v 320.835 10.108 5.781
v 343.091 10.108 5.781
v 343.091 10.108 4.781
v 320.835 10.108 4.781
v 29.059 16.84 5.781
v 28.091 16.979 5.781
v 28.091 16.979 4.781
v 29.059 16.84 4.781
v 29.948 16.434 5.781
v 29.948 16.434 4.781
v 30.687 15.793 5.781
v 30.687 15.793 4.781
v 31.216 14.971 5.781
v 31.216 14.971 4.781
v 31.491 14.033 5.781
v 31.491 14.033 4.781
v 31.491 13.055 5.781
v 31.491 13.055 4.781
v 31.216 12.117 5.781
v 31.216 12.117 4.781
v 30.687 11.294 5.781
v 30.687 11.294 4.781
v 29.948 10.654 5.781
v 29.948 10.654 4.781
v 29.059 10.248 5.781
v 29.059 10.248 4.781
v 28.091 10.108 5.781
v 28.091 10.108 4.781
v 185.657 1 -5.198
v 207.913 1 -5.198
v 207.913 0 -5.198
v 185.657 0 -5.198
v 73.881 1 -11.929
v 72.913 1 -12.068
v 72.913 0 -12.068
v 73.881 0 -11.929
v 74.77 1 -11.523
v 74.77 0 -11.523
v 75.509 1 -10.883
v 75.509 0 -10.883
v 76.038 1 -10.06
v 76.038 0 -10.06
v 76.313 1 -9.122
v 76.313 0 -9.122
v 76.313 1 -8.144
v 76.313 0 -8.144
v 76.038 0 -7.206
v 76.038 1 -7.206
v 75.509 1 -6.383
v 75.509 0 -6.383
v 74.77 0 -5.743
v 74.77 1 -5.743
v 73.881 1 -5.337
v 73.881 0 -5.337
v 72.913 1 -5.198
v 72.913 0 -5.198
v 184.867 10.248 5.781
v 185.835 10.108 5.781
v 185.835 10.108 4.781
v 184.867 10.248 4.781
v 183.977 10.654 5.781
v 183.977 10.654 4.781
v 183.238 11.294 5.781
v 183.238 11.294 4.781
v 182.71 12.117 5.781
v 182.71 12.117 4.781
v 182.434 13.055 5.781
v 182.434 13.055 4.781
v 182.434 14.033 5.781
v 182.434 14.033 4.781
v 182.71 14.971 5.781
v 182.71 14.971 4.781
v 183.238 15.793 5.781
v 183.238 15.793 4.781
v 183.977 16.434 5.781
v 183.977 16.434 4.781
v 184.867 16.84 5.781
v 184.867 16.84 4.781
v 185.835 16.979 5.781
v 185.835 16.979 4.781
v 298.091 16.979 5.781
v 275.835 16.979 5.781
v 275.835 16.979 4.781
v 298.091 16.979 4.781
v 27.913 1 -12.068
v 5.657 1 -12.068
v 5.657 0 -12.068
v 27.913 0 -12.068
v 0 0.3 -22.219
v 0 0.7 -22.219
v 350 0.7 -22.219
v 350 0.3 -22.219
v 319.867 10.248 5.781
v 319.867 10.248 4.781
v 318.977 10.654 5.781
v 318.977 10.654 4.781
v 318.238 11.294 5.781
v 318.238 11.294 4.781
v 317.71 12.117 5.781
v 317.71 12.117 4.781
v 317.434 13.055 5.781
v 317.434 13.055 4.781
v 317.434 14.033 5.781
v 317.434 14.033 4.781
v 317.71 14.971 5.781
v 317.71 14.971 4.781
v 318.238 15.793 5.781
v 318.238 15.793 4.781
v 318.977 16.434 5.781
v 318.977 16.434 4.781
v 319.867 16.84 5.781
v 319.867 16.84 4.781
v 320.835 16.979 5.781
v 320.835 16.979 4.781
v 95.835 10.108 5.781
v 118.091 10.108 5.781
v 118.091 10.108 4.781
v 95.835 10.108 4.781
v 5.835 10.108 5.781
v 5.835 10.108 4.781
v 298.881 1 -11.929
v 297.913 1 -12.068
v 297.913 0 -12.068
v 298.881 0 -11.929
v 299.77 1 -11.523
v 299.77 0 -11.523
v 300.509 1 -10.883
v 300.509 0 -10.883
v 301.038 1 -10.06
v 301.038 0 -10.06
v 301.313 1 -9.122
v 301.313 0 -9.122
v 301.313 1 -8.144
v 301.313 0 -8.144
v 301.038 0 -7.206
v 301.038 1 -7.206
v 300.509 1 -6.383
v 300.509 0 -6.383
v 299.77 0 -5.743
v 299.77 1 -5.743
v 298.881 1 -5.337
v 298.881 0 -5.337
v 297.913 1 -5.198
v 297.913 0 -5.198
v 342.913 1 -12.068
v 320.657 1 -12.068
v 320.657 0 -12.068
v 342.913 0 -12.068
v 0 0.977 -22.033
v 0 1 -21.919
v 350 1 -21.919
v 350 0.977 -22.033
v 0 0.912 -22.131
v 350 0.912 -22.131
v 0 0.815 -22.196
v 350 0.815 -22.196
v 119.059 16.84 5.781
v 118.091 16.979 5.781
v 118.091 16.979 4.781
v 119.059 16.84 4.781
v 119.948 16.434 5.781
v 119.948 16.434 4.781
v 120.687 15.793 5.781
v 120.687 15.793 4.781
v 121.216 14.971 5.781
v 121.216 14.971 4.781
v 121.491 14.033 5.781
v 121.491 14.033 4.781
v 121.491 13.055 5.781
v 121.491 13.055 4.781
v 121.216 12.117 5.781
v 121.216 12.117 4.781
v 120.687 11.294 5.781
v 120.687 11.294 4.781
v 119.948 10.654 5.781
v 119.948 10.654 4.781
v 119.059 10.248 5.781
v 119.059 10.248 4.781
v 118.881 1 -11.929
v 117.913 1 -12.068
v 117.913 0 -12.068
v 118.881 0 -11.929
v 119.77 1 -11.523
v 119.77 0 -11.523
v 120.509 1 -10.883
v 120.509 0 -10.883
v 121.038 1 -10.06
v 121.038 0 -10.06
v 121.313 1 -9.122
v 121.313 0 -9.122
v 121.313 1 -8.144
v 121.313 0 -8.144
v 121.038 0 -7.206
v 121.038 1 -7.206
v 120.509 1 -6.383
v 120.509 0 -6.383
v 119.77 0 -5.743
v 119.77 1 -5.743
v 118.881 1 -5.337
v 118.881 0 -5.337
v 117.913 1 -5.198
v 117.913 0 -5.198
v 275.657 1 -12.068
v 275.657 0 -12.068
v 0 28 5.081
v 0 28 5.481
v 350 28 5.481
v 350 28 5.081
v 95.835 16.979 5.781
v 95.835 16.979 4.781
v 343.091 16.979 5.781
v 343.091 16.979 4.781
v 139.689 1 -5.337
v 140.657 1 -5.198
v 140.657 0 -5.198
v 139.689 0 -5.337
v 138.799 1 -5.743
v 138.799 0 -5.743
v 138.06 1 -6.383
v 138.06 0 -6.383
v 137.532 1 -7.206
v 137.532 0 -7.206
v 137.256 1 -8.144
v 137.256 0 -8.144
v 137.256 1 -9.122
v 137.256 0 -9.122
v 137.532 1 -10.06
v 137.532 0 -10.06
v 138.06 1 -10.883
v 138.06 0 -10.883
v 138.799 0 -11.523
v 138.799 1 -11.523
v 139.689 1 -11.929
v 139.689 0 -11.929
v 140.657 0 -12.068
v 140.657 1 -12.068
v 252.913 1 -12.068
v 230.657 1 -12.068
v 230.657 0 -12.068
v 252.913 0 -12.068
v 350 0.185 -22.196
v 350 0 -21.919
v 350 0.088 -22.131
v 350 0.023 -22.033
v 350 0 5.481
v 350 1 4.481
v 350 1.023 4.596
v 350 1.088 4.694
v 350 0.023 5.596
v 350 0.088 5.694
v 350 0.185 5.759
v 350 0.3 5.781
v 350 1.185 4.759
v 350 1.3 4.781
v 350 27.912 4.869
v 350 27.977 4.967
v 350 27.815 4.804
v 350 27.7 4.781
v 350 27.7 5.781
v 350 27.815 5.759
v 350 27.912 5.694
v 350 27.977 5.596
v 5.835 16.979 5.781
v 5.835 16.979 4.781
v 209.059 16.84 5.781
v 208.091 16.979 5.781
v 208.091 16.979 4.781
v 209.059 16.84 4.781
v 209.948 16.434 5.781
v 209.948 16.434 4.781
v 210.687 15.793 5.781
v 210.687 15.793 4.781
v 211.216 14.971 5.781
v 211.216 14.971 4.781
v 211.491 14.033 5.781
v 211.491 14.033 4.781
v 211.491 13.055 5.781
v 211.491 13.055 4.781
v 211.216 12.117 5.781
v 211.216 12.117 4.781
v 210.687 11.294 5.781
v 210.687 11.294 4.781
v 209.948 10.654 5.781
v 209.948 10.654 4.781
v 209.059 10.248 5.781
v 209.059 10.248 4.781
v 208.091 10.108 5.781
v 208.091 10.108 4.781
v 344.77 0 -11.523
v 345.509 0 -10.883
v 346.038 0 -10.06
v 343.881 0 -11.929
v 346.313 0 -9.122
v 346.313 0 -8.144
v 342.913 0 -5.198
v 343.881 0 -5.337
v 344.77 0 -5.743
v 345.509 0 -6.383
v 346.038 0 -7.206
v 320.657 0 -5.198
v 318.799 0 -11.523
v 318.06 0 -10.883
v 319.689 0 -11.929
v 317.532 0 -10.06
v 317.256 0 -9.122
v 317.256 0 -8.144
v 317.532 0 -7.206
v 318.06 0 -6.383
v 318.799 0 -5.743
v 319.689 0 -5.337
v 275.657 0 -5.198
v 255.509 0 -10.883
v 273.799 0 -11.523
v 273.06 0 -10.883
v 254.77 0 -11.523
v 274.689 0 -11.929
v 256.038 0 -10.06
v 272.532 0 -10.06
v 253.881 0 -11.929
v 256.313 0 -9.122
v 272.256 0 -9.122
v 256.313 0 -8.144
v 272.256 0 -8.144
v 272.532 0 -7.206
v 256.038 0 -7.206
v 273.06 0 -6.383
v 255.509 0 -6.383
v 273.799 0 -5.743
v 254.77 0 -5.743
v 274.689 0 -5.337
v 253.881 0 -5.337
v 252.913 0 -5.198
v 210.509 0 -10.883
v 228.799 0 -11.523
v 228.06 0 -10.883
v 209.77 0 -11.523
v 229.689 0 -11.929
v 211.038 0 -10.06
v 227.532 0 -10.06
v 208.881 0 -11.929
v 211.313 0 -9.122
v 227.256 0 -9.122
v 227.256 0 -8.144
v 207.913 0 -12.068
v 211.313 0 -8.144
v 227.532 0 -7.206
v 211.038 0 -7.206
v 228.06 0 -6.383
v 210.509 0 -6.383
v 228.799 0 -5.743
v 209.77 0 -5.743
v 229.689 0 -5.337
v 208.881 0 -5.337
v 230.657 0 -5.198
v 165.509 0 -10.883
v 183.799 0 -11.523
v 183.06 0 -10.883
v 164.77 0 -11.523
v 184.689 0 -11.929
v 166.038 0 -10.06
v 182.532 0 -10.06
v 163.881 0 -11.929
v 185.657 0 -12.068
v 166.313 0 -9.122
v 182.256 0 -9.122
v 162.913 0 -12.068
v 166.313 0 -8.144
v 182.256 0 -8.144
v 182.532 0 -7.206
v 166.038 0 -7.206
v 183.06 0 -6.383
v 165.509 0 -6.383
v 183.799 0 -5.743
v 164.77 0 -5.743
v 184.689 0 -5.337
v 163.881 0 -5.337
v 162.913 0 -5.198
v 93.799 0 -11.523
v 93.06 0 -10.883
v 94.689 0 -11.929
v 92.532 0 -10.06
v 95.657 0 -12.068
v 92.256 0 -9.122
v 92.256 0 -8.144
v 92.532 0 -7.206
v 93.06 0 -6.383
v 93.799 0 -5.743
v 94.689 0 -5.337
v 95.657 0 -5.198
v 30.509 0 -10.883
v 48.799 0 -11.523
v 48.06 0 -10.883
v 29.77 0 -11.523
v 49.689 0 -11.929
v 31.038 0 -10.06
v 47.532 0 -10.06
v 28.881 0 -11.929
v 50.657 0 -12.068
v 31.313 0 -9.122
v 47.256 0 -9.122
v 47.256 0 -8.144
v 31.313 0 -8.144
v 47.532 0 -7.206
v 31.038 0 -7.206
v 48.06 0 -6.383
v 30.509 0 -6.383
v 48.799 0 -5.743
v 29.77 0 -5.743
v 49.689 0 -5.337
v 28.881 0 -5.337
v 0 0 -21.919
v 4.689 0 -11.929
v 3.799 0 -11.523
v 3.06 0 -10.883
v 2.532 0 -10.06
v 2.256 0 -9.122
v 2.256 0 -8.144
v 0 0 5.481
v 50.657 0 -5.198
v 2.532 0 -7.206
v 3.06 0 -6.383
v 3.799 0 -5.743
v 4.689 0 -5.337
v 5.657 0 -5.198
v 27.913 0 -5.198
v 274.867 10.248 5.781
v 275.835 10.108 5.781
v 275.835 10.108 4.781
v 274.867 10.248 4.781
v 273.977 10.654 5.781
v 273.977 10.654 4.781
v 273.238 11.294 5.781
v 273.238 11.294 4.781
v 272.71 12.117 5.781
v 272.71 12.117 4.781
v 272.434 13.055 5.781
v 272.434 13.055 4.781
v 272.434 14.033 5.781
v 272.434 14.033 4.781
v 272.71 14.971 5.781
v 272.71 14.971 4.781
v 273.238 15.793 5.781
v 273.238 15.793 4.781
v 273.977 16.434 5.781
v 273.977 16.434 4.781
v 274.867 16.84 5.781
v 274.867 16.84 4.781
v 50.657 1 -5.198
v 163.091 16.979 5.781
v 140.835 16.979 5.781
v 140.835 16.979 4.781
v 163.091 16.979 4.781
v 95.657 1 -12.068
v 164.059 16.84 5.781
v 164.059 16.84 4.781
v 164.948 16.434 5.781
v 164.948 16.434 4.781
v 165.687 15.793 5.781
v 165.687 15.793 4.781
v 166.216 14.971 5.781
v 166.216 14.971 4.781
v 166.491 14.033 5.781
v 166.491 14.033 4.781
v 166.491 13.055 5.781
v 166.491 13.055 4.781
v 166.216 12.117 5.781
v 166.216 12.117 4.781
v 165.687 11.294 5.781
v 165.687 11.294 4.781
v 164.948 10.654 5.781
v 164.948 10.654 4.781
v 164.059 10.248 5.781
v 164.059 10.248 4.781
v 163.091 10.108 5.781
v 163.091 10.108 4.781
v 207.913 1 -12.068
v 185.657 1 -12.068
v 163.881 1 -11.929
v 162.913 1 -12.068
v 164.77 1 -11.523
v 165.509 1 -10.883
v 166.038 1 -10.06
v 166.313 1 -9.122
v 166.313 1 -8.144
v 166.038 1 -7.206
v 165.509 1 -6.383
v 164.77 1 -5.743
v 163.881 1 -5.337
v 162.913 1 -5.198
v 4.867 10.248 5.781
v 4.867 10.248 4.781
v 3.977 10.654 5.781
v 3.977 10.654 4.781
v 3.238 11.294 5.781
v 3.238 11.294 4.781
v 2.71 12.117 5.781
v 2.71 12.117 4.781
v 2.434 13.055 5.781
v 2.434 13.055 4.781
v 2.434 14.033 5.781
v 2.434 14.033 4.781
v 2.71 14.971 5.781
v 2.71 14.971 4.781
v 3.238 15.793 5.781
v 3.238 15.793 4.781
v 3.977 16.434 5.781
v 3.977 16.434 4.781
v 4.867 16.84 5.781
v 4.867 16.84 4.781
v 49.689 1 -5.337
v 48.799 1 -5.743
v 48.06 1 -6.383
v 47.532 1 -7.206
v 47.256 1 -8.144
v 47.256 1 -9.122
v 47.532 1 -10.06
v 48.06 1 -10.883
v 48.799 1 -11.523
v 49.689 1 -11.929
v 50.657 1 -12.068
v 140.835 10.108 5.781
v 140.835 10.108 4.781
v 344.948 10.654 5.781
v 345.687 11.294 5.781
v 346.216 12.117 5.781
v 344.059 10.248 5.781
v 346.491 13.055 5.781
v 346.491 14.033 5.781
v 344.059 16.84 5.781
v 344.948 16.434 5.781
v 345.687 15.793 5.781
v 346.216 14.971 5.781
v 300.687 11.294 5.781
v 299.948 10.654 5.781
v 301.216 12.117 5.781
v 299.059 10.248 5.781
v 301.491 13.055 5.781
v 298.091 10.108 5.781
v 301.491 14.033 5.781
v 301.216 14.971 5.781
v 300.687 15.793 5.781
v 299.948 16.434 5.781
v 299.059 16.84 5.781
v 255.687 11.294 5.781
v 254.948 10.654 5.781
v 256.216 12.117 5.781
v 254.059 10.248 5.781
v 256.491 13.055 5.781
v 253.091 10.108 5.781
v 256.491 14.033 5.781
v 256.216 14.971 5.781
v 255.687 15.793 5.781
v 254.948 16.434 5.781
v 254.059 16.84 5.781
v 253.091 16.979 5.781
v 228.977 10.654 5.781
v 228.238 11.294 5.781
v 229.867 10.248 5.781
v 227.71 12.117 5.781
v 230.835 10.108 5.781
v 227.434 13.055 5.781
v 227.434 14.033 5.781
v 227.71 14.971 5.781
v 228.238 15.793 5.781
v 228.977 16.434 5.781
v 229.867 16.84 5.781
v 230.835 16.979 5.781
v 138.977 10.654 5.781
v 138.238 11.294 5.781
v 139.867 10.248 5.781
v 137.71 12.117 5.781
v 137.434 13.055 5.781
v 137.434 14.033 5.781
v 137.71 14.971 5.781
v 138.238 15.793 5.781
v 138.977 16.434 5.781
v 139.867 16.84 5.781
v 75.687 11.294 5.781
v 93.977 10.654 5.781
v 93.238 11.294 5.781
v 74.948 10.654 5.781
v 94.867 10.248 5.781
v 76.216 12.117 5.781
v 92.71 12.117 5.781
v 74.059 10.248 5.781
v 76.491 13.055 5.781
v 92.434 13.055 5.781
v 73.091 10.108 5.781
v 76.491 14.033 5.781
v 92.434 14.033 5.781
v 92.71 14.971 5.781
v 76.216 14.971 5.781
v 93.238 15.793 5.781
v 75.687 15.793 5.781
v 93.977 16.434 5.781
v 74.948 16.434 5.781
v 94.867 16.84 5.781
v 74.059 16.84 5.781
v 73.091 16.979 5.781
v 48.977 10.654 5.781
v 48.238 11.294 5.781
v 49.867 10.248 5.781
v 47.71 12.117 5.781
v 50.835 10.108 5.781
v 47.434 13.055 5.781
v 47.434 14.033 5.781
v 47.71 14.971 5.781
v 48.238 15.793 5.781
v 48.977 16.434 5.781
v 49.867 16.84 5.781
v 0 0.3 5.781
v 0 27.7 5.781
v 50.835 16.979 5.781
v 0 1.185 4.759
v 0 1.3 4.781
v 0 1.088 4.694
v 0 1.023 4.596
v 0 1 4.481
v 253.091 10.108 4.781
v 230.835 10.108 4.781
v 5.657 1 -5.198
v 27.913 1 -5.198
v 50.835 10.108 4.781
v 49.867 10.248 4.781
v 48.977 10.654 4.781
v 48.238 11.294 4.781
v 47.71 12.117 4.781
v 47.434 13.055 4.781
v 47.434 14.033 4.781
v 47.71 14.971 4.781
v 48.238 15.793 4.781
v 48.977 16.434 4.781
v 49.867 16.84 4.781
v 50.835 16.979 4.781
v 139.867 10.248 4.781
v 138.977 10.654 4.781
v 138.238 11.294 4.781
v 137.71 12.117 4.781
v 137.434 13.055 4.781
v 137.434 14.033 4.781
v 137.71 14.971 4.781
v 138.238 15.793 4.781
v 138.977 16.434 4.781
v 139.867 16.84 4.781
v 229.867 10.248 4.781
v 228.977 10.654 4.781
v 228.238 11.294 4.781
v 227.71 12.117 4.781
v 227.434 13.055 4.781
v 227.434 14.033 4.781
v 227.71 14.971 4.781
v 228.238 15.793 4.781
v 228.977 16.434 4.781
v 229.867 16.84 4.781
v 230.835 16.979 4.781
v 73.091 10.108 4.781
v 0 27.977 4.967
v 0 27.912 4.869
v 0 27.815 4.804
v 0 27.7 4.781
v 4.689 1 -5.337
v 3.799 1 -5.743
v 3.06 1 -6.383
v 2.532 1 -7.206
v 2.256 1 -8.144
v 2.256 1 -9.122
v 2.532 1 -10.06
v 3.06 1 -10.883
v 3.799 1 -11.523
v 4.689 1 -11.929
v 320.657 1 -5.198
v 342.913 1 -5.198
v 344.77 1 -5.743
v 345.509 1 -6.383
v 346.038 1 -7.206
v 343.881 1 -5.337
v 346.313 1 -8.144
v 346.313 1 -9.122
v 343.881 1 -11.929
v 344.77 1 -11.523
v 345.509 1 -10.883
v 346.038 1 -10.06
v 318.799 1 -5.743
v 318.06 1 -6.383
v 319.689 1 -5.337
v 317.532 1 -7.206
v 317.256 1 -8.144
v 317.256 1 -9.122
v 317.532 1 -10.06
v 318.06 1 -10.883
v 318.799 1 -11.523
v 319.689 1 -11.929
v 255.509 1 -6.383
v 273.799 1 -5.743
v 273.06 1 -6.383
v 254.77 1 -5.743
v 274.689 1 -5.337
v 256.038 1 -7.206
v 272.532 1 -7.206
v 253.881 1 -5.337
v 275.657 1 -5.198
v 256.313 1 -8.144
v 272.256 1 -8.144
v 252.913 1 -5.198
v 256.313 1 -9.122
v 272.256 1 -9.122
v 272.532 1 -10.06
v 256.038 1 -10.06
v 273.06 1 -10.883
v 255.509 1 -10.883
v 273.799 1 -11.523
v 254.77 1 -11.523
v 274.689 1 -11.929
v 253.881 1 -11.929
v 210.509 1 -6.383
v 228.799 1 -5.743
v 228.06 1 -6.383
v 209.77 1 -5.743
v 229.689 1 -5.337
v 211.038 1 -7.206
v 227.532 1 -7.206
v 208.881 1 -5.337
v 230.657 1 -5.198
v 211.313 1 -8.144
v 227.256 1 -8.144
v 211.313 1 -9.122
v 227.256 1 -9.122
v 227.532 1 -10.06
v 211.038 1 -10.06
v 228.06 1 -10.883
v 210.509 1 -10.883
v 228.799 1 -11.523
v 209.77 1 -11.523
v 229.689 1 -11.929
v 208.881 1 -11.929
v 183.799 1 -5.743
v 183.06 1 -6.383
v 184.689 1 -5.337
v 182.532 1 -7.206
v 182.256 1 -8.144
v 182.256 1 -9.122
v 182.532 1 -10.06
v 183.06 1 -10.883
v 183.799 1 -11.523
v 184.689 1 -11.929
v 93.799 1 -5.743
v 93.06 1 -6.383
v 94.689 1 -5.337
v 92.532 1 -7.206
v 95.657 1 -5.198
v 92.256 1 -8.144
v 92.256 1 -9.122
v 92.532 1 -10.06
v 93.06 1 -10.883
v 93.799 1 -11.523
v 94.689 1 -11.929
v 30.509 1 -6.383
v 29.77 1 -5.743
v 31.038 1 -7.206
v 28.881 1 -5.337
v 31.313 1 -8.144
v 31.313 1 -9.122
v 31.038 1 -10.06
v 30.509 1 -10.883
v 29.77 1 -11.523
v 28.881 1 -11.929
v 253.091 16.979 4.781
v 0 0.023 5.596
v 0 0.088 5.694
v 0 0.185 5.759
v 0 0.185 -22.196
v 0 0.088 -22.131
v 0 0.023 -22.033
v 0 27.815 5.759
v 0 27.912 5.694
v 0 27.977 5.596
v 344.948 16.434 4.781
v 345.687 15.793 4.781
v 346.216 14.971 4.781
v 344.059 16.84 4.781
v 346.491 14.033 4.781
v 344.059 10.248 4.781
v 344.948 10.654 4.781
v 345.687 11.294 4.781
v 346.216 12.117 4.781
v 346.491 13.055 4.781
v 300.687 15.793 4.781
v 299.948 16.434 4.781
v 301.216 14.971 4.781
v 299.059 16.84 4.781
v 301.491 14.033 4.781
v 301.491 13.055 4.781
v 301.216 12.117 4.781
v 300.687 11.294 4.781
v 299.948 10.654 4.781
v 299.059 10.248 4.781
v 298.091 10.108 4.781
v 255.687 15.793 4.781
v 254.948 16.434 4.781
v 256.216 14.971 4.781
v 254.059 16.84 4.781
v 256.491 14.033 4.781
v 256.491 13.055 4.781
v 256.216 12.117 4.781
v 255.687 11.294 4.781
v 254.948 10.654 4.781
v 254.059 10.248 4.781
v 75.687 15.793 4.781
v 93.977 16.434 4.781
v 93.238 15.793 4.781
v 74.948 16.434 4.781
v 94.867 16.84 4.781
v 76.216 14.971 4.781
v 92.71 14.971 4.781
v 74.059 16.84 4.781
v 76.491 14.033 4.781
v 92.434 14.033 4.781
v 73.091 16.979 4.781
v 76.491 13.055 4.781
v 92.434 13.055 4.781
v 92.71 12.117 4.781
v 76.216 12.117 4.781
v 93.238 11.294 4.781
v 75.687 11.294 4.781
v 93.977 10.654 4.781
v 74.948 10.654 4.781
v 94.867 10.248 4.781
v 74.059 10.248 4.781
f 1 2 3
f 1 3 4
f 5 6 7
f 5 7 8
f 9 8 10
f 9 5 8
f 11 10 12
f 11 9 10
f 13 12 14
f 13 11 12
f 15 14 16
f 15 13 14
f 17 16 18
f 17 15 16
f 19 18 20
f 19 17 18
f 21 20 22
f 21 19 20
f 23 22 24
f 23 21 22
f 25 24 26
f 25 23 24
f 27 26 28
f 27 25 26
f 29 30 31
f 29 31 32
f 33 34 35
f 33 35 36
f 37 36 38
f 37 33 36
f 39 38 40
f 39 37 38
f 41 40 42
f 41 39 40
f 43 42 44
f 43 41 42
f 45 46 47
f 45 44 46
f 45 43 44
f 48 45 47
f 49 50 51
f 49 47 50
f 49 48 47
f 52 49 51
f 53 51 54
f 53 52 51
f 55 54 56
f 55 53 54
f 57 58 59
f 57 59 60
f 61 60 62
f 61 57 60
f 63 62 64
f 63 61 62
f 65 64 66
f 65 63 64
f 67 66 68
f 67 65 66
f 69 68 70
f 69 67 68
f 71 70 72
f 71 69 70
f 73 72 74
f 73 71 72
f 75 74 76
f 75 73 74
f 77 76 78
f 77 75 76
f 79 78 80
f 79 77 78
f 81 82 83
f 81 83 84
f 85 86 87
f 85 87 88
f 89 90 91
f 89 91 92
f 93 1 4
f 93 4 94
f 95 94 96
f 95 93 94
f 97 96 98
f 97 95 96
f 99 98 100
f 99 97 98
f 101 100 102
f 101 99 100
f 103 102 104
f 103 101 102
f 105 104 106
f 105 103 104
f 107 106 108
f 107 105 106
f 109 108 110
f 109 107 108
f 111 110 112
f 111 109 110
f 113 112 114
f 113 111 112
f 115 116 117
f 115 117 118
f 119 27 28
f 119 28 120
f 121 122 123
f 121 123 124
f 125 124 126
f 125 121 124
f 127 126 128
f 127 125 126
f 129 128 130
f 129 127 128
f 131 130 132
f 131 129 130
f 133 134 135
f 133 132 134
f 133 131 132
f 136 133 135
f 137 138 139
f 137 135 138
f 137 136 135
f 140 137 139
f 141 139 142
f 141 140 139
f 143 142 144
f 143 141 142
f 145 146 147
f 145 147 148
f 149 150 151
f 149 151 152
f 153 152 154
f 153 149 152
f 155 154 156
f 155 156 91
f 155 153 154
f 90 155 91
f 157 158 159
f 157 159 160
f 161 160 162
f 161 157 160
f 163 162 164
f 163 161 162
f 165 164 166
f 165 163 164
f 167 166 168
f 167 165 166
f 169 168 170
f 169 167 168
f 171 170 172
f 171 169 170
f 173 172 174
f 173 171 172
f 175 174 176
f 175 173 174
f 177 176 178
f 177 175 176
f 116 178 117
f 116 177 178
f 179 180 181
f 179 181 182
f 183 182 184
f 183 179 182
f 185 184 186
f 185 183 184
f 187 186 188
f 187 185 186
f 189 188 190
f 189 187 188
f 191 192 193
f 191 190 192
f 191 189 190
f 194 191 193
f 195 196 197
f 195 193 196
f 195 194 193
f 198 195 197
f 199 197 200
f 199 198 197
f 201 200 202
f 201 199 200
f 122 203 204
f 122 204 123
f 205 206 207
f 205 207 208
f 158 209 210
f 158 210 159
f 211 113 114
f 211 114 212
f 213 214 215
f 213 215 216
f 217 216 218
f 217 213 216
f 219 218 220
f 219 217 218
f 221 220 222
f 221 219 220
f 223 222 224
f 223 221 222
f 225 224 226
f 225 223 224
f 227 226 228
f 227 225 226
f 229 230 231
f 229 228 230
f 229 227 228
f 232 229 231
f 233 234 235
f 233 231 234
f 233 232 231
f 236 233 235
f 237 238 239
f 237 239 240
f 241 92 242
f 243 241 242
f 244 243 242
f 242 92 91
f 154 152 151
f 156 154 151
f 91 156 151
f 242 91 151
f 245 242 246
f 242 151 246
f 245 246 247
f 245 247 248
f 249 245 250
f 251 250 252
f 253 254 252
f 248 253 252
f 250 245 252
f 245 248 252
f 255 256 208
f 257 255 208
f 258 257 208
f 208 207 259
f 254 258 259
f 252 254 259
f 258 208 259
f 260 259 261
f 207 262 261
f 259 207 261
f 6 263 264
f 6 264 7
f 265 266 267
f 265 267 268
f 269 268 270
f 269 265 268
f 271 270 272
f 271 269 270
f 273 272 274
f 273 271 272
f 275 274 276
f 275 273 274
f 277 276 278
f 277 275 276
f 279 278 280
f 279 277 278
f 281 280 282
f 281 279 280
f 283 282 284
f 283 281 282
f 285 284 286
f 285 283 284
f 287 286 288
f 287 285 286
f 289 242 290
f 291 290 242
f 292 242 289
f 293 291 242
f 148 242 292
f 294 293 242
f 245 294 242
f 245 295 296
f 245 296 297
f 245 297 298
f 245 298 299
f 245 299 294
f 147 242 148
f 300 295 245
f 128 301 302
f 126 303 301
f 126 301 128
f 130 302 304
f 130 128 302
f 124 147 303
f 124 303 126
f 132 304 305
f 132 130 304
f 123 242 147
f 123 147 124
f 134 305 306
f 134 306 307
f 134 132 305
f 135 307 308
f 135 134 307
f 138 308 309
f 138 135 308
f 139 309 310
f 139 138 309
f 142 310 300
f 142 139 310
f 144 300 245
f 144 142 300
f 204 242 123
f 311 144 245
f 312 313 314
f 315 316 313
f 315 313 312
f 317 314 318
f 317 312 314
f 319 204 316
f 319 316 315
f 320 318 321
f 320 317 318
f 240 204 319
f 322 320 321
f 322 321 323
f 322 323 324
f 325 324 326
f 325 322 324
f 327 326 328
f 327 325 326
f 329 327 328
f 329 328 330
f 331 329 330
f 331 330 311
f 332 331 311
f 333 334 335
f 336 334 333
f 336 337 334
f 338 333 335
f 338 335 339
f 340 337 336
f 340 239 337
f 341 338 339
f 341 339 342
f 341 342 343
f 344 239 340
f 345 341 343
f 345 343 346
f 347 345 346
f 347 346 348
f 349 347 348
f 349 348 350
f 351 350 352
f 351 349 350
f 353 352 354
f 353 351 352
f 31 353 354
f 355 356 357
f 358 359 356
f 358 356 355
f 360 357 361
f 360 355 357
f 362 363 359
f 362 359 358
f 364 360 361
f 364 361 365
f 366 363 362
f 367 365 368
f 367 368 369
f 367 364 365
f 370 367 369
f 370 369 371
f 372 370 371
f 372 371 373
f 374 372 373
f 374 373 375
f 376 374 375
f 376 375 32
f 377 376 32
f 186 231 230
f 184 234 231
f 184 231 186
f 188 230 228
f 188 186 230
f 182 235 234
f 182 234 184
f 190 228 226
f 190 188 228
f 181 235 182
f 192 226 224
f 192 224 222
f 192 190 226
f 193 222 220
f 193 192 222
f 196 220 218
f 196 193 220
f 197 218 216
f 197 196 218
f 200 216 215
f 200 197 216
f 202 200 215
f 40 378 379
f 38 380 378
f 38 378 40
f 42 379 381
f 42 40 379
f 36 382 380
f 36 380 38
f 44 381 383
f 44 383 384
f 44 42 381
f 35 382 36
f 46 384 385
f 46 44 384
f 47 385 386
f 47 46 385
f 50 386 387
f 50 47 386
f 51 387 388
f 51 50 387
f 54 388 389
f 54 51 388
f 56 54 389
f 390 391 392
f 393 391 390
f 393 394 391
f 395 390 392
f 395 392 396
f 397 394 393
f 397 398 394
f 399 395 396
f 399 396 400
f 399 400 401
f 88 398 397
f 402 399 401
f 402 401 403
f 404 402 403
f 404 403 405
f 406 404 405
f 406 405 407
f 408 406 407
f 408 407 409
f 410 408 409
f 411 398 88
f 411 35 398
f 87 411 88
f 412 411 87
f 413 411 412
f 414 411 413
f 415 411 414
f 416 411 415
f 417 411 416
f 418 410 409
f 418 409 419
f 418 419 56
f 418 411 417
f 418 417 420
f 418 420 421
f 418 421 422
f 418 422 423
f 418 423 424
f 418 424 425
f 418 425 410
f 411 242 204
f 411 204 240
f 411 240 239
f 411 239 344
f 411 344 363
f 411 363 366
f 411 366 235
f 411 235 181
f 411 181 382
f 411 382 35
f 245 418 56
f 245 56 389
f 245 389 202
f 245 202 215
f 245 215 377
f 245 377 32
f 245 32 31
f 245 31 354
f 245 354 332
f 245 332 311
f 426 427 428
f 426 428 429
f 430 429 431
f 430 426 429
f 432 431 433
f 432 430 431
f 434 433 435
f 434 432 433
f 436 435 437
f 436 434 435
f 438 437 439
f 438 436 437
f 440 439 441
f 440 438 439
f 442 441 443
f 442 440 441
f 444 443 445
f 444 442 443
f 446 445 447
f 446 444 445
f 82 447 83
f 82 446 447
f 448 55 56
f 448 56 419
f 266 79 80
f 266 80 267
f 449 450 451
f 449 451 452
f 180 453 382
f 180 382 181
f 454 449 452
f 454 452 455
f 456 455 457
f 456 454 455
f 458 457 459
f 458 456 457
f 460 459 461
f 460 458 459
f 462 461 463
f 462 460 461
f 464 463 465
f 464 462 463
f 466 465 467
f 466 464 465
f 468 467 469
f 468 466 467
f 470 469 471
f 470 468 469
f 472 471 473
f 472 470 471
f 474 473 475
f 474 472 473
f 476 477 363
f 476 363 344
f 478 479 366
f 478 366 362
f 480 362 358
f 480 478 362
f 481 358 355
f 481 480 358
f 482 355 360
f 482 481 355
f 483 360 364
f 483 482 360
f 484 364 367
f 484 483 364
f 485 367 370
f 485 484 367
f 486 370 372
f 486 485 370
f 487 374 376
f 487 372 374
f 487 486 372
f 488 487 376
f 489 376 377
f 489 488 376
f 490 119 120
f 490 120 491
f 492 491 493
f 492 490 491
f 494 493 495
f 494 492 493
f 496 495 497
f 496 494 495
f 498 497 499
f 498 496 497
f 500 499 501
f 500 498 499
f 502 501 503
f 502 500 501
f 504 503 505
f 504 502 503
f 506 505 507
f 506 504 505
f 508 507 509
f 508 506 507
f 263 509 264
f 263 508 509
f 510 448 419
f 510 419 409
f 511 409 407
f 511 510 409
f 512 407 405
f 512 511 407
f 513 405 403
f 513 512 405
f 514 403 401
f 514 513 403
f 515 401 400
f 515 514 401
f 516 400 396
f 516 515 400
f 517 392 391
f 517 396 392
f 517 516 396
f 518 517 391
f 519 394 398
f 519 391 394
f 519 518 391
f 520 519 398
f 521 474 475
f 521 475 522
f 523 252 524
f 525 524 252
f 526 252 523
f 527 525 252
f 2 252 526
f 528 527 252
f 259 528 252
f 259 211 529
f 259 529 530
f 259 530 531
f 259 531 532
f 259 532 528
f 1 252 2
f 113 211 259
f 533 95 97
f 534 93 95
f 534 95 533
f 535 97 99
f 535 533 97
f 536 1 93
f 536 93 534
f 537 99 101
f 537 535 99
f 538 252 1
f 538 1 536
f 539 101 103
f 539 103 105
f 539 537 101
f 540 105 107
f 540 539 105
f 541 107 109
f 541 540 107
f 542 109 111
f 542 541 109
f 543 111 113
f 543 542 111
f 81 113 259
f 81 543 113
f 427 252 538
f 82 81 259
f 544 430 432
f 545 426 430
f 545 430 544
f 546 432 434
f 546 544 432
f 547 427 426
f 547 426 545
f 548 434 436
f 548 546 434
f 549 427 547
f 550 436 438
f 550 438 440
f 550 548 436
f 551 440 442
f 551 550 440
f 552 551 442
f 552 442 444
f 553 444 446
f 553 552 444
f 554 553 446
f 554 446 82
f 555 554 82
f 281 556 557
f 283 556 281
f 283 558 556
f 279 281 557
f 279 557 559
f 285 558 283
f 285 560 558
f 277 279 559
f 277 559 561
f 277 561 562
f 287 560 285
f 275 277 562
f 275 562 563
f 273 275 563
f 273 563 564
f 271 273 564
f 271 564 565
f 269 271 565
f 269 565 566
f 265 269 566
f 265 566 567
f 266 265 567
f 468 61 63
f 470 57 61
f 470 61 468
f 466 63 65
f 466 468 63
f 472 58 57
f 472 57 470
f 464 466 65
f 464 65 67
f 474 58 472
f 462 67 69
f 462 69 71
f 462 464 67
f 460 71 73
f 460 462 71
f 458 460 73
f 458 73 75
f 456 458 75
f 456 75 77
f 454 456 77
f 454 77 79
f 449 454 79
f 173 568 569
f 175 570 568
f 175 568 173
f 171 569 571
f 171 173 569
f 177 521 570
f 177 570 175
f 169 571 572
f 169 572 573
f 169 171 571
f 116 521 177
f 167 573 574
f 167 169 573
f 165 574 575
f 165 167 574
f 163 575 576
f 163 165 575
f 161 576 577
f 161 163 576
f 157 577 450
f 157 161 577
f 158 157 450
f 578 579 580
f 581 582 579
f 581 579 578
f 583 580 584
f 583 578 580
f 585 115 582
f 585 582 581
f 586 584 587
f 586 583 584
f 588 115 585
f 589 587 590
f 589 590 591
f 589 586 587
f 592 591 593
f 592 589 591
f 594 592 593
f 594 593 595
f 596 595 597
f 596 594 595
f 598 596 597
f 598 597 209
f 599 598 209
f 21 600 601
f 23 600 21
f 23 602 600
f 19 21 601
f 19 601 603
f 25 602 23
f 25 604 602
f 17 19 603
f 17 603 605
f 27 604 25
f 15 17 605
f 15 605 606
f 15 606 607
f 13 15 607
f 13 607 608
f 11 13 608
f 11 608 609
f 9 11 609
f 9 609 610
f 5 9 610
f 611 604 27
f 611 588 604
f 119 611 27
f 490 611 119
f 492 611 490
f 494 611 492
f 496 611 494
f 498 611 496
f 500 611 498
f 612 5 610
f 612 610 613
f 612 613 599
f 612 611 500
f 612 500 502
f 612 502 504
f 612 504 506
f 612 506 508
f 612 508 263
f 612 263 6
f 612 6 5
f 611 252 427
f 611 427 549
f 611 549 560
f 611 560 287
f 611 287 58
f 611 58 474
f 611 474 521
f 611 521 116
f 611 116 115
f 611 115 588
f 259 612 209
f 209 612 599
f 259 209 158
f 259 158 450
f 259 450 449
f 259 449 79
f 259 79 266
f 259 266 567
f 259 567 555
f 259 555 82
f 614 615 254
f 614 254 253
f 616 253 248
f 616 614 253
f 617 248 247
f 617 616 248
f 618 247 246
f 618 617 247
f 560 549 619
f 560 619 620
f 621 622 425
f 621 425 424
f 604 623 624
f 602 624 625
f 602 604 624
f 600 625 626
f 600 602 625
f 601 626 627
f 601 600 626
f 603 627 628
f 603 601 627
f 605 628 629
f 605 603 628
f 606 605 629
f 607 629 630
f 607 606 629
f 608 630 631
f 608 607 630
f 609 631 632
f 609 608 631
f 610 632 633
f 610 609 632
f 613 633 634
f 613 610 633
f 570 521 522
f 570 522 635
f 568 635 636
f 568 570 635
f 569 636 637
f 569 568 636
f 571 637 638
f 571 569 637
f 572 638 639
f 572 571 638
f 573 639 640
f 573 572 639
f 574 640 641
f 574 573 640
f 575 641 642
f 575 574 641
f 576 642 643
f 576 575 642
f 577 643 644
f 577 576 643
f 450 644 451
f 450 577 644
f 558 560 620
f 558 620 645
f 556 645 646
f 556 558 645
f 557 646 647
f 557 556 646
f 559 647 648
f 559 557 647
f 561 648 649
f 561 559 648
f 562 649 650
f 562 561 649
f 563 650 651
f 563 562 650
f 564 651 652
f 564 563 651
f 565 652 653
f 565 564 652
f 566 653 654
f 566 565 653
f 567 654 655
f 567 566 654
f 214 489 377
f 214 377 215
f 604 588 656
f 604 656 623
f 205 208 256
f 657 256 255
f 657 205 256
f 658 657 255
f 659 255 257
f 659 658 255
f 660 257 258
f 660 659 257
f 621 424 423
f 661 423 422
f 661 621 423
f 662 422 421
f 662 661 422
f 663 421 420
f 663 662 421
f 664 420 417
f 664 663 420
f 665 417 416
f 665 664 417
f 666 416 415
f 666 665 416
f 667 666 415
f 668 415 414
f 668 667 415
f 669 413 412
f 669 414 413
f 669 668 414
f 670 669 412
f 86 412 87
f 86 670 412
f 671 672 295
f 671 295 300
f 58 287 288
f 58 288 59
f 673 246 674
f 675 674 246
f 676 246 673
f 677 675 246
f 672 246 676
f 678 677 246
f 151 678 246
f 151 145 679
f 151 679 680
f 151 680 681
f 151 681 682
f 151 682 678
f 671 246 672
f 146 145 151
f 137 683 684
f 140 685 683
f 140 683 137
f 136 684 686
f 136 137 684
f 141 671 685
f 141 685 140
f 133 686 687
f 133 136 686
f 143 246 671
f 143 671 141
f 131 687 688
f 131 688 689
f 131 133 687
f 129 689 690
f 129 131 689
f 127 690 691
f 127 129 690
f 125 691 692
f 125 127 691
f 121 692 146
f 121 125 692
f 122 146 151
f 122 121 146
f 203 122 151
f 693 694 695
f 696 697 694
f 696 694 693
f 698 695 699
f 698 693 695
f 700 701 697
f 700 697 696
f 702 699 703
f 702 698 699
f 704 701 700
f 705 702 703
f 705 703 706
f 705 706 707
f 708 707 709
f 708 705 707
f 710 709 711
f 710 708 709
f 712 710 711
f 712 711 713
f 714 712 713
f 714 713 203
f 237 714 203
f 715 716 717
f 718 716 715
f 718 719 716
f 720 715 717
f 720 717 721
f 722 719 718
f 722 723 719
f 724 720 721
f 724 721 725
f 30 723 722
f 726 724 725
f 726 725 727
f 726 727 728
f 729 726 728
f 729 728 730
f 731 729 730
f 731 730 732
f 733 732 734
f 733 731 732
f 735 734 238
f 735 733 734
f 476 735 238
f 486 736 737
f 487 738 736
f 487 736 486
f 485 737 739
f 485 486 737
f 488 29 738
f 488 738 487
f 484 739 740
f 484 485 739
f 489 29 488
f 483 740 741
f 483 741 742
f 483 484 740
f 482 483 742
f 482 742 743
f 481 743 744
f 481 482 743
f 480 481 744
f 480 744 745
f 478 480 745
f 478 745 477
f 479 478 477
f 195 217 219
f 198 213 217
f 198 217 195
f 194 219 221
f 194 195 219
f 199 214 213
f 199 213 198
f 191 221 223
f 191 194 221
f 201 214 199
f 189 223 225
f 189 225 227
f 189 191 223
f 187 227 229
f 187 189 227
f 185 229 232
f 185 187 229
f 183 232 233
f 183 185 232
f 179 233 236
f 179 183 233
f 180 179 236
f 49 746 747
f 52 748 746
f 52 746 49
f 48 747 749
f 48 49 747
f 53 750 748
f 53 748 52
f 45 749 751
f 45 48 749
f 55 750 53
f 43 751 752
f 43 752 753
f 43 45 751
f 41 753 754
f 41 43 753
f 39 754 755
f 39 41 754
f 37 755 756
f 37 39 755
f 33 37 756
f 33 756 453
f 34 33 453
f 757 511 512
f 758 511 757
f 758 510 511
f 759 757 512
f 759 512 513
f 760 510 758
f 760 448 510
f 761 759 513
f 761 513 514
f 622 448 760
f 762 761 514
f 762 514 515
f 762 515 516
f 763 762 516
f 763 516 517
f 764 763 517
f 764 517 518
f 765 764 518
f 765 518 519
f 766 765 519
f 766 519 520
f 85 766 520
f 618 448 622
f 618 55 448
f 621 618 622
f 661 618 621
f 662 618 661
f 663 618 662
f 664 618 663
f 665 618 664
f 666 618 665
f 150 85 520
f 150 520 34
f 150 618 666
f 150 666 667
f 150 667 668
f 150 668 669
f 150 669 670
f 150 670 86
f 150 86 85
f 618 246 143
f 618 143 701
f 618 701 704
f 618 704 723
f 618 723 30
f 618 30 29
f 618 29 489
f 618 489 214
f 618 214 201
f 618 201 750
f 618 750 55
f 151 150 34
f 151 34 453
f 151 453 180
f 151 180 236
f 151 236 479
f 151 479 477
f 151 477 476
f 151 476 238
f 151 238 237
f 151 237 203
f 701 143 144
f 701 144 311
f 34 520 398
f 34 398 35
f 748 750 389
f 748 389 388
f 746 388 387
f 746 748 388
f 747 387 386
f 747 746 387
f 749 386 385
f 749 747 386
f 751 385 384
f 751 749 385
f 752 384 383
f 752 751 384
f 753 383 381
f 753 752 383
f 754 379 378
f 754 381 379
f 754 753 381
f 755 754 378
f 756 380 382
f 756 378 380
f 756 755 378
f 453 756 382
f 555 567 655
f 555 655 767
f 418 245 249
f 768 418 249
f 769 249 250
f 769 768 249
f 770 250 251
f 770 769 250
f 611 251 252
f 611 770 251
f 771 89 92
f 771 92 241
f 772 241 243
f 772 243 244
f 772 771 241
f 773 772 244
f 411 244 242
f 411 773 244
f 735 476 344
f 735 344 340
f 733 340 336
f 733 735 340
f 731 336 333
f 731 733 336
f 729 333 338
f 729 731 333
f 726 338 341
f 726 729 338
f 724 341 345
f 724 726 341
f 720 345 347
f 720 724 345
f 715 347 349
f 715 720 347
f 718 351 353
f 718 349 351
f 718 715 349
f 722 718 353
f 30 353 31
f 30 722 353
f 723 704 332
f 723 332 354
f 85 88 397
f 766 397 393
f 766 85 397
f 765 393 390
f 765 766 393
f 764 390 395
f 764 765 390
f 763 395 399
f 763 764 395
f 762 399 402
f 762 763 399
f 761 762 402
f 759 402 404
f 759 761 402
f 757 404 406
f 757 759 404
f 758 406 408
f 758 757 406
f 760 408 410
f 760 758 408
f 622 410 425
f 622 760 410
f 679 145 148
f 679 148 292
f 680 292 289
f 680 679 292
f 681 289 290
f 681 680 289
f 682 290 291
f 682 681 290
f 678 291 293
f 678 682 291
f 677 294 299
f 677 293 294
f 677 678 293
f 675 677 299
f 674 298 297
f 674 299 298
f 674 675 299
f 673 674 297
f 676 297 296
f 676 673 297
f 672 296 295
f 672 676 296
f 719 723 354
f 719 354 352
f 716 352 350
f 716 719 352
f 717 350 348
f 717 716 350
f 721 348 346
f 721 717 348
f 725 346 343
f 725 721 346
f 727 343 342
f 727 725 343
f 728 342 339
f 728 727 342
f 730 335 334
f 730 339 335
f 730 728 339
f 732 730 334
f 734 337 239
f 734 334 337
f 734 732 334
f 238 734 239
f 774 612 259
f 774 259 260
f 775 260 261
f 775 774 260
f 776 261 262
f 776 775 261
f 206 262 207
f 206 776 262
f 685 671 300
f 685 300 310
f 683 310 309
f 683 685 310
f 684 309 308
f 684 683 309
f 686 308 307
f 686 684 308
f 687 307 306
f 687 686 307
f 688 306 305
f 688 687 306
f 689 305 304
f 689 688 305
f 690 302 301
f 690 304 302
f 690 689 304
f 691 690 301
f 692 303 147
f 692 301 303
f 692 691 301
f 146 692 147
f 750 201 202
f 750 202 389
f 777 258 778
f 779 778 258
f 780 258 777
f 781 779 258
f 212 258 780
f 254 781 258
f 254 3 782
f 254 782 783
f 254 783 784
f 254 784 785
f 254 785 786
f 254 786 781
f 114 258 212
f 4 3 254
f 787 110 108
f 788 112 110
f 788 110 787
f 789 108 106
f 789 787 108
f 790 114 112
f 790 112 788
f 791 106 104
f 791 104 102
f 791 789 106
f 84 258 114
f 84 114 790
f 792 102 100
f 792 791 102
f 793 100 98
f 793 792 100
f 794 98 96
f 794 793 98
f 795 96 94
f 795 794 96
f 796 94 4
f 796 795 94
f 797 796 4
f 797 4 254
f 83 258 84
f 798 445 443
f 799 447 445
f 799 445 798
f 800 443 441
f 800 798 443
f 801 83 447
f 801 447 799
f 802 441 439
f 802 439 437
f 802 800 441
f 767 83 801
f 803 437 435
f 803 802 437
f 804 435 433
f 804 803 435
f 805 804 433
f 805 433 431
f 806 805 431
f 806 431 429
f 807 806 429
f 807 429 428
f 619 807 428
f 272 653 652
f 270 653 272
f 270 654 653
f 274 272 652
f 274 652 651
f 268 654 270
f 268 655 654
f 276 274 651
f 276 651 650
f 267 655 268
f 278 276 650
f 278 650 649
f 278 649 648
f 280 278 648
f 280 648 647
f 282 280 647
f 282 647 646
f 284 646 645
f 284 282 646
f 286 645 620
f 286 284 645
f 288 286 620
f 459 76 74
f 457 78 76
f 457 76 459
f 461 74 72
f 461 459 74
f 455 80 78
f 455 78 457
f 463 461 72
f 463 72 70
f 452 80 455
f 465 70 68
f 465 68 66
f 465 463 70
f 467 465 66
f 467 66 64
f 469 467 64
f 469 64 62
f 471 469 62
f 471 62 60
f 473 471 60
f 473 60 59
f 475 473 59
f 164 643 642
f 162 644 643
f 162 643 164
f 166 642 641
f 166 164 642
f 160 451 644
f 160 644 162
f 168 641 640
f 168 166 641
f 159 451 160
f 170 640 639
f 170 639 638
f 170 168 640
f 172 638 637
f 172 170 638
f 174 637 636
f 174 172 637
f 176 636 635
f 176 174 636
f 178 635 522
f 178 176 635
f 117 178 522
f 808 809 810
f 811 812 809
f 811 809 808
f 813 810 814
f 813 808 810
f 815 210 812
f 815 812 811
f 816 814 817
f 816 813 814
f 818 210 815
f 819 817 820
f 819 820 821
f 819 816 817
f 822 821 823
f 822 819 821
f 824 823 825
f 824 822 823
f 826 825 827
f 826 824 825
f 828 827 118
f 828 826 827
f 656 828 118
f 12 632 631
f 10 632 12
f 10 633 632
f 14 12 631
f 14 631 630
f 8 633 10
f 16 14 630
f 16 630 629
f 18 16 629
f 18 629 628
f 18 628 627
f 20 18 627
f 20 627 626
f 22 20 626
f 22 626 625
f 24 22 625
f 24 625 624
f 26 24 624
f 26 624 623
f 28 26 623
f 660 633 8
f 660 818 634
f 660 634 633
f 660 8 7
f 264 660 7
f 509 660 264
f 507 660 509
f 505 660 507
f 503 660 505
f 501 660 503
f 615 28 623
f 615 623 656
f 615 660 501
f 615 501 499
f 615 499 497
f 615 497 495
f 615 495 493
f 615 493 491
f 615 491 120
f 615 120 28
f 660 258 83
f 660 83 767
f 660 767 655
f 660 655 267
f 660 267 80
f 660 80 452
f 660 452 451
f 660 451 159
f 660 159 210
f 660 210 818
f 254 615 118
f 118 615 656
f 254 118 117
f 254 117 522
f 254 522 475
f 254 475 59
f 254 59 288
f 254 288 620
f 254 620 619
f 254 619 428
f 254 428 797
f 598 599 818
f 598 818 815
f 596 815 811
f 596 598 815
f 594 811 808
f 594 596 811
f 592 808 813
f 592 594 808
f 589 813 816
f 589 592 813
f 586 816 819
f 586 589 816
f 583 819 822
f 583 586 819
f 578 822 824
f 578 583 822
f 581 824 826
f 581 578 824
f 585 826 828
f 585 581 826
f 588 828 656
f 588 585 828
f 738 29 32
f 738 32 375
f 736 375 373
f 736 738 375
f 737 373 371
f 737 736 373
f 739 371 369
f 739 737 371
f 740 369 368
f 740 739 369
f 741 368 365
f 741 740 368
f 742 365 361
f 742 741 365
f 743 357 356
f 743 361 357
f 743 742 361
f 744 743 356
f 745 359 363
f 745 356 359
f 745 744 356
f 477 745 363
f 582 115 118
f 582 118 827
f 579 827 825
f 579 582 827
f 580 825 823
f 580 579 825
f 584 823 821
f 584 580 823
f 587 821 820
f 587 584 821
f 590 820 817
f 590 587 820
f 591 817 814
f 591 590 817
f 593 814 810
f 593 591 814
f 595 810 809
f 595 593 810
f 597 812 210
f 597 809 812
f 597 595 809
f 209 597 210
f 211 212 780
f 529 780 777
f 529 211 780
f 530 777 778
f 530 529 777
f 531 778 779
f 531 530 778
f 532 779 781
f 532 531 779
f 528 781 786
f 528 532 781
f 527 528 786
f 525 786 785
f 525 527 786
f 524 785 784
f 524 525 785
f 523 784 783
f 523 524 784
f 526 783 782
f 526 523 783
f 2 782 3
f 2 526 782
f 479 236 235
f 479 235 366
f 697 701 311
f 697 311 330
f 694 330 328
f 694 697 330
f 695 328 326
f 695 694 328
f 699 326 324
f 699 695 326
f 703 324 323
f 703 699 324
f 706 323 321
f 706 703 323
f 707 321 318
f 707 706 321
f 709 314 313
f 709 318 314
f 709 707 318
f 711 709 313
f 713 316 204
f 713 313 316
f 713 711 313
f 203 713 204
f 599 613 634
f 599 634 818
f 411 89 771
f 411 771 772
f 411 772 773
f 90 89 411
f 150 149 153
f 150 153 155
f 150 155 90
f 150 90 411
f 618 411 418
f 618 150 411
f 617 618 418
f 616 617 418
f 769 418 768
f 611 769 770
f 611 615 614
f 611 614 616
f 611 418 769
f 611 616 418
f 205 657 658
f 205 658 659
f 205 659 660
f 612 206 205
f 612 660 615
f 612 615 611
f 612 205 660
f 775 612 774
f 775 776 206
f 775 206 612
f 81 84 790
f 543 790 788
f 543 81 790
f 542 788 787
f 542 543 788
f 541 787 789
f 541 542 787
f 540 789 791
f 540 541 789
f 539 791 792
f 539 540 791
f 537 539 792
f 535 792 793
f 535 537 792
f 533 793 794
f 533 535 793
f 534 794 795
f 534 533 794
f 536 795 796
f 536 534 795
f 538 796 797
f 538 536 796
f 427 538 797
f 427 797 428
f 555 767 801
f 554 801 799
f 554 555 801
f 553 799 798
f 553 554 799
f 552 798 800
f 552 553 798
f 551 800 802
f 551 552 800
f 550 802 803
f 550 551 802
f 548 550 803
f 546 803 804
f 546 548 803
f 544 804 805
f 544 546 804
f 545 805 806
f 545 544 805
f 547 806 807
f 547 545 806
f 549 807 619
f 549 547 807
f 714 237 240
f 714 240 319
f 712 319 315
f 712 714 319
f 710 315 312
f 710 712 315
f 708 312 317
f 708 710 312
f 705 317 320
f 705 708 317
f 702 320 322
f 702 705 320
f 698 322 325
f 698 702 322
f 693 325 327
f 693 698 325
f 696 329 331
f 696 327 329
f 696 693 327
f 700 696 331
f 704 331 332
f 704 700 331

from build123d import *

# Parameters (mm, degrees)
EXTRUDE_1_DEPTH     = 350
CUT_EXTRUDE_1_REACH = 30
CUT_EXTRUDE_2_REACH = 3


with BuildPart() as part:
    # 草图1 → 凸台-拉伸1 (new body)
    with BuildSketch(Plane(origin=(0, 0, 0), x_dir=(0, 0, -1), z_dir=(1, 0, 0))):
        with BuildLine():
            Line((0, 0), (-5.481376518, 0))
            ThreePointArc((-5.481376518, 0), (-5.693508553, 0.087867966), (-5.781376518, 0.3))
            Line((-5.781376518, 0.3), (-5.781376518, 27.7))
            ThreePointArc((-5.781376518, 27.7), (-5.693508553, 27.912132034), (-5.481376518, 28))
            Line((-5.481376518, 28), (-5.081376518, 28))
            ThreePointArc((-5.081376518, 28), (-4.869244484, 27.912132034), (-4.781376518, 27.7))
            Line((-4.781376518, 27.7), (-4.781376518, 1.3))
            ThreePointArc((-4.781376518, 1.3), (-4.693508553, 1.087867966), (-4.481376518, 1))
            Line((-4.481376518, 1), (21.918623482, 1))
            ThreePointArc((21.918623482, 1), (22.130755516, 0.912132034), (22.218623482, 0.7))
            Line((22.218623482, 0.7), (22.218623482, 0.3))
            ThreePointArc((22.218623482, 0.3), (22.130755516, 0.087867966), (21.918623482, 0))
            Line((21.918623482, 0), (0, 0))
        make_face()
    extrude(amount=EXTRUDE_1_DEPTH)

    # 草图2 → 切除-拉伸1 (cut, up to next)
    with BuildSketch(Plane.XY.offset(5.781376518), mode=Mode.PRIVATE) as cut_extrude_1_sk1:
        with BuildLine():
            Line((5.834676913, 16.979123609), (28.090979636, 16.979123609))
            ThreePointArc((28.090979636, 16.979123609), (31.526327183, 13.543776063), (28.090979636, 10.108428517))
            Line((28.090979636, 10.108428517), (5.834676913, 10.108428517))
            ThreePointArc((5.834676913, 10.108428517), (2.399329367, 13.543776063), (5.834676913, 16.979123609))
        make_face()
    cut_extrude_1_tool1 = extrude(cut_extrude_1_sk1.sketch, amount=-CUT_EXTRUDE_1_REACH, mode=Mode.PRIVATE) & part.part
    add(cut_extrude_1_tool1.solids().sort_by_distance((16.962828, 13.543776, 5.781377))[0], mode=Mode.SUBTRACT)
    # 草图2 → 切除-拉伸1 (cut, up to next)
    with BuildSketch(Plane.XY.offset(5.781376518), mode=Mode.PRIVATE) as cut_extrude_1_sk2:
        with BuildLine():
            Line((50.834676913, 16.979123609), (73.090979636, 16.979123609))
            ThreePointArc((73.090979636, 16.979123609), (76.526327183, 13.543776063), (73.090979636, 10.108428517))
            Line((73.090979636, 10.108428517), (50.834676913, 10.108428517))
            ThreePointArc((50.834676913, 10.108428517), (47.399329367, 13.543776063), (50.834676913, 16.979123609))
        make_face()
    cut_extrude_1_tool2 = extrude(cut_extrude_1_sk2.sketch, amount=-CUT_EXTRUDE_1_REACH, mode=Mode.PRIVATE) & part.part
    add(cut_extrude_1_tool2.solids().sort_by_distance((61.962828, 13.543776, 5.781377))[0], mode=Mode.SUBTRACT)
    # 草图2 → 切除-拉伸1 (cut, up to next)
    with BuildSketch(Plane.XY.offset(5.781376518), mode=Mode.PRIVATE) as cut_extrude_1_sk3:
        with BuildLine():
            Line((95.834676913, 16.979123609), (118.090979636, 16.979123609))
            ThreePointArc((118.090979636, 16.979123609), (121.526327183, 13.543776063), (118.090979636, 10.108428517))
            Line((118.090979636, 10.108428517), (95.834676913, 10.108428517))
            ThreePointArc((95.834676913, 10.108428517), (92.399329367, 13.543776063), (95.834676913, 16.979123609))
        make_face()
    cut_extrude_1_tool3 = extrude(cut_extrude_1_sk3.sketch, amount=-CUT_EXTRUDE_1_REACH, mode=Mode.PRIVATE) & part.part
    add(cut_extrude_1_tool3.solids().sort_by_distance((106.962828, 13.543776, 5.781377))[0], mode=Mode.SUBTRACT)
    # 草图2 → 切除-拉伸1 (cut, up to next)
    with BuildSketch(Plane.XY.offset(5.781376518), mode=Mode.PRIVATE) as cut_extrude_1_sk4:
        with BuildLine():
            Line((140.834676913, 16.979123609), (163.090979636, 16.979123609))
            ThreePointArc((163.090979636, 16.979123609), (166.526327183, 13.543776063), (163.090979636, 10.108428517))
            Line((163.090979636, 10.108428517), (140.834676913, 10.108428517))
            ThreePointArc((140.834676913, 10.108428517), (137.399329367, 13.543776063), (140.834676913, 16.979123609))
        make_face()
    cut_extrude_1_tool4 = extrude(cut_extrude_1_sk4.sketch, amount=-CUT_EXTRUDE_1_REACH, mode=Mode.PRIVATE) & part.part
    add(cut_extrude_1_tool4.solids().sort_by_distance((151.962828, 13.543776, 5.781377))[0], mode=Mode.SUBTRACT)
    # 草图2 → 切除-拉伸1 (cut, up to next)
    with BuildSketch(Plane.XY.offset(5.781376518), mode=Mode.PRIVATE) as cut_extrude_1_sk5:
        with BuildLine():
            Line((185.834676913, 16.979123609), (208.090979636, 16.979123609))
            ThreePointArc((208.090979636, 16.979123609), (211.526327183, 13.543776063), (208.090979636, 10.108428517))
            Line((208.090979636, 10.108428517), (185.834676913, 10.108428517))
            ThreePointArc((185.834676913, 10.108428517), (182.399329367, 13.543776063), (185.834676913, 16.979123609))
        make_face()
    cut_extrude_1_tool5 = extrude(cut_extrude_1_sk5.sketch, amount=-CUT_EXTRUDE_1_REACH, mode=Mode.PRIVATE) & part.part
    add(cut_extrude_1_tool5.solids().sort_by_distance((196.962828, 13.543776, 5.781377))[0], mode=Mode.SUBTRACT)
    # 草图2 → 切除-拉伸1 (cut, up to next)
    with BuildSketch(Plane.XY.offset(5.781376518), mode=Mode.PRIVATE) as cut_extrude_1_sk6:
        with BuildLine():
            Line((230.834676913, 16.979123609), (253.090979636, 16.979123609))
            ThreePointArc((253.090979636, 16.979123609), (256.526327183, 13.543776063), (253.090979636, 10.108428517))
            Line((253.090979636, 10.108428517), (230.834676913, 10.108428517))
            ThreePointArc((230.834676913, 10.108428517), (227.399329367, 13.543776063), (230.834676913, 16.979123609))
        make_face()
    cut_extrude_1_tool6 = extrude(cut_extrude_1_sk6.sketch, amount=-CUT_EXTRUDE_1_REACH, mode=Mode.PRIVATE) & part.part
    add(cut_extrude_1_tool6.solids().sort_by_distance((241.962828, 13.543776, 5.781377))[0], mode=Mode.SUBTRACT)
    # 草图2 → 切除-拉伸1 (cut, up to next)
    with BuildSketch(Plane.XY.offset(5.781376518), mode=Mode.PRIVATE) as cut_extrude_1_sk7:
        with BuildLine():
            Line((275.834676913, 16.979123609), (298.090979636, 16.979123609))
            ThreePointArc((298.090979636, 16.979123609), (301.526327183, 13.543776063), (298.090979636, 10.108428517))
            Line((298.090979636, 10.108428517), (275.834676913, 10.108428517))
            ThreePointArc((275.834676913, 10.108428517), (272.399329367, 13.543776063), (275.834676913, 16.979123609))
        make_face()
    cut_extrude_1_tool7 = extrude(cut_extrude_1_sk7.sketch, amount=-CUT_EXTRUDE_1_REACH, mode=Mode.PRIVATE) & part.part
    add(cut_extrude_1_tool7.solids().sort_by_distance((286.962828, 13.543776, 5.781377))[0], mode=Mode.SUBTRACT)
    # 草图2 → 切除-拉伸1 (cut, up to next)
    with BuildSketch(Plane.XY.offset(5.781376518), mode=Mode.PRIVATE) as cut_extrude_1_sk8:
        with BuildLine():
            Line((320.834676913, 16.979123609), (343.090979636, 16.979123609))
            ThreePointArc((343.090979636, 16.979123609), (346.526327183, 13.543776063), (343.090979636, 10.108428517))
            Line((343.090979636, 10.108428517), (320.834676913, 10.108428517))
            ThreePointArc((320.834676913, 10.108428517), (317.399329367, 13.543776063), (320.834676913, 16.979123609))
        make_face()
    cut_extrude_1_tool8 = extrude(cut_extrude_1_sk8.sketch, amount=-CUT_EXTRUDE_1_REACH, mode=Mode.PRIVATE) & part.part
    add(cut_extrude_1_tool8.solids().sort_by_distance((331.962828, 13.543776, 5.781377))[0], mode=Mode.SUBTRACT)

    # 草图3 → 切除-拉伸2 (cut, up to next)
    with BuildSketch(Plane(origin=(0, 1, 0), x_dir=(1, 0, 0), z_dir=(0, 1, 0)), mode=Mode.PRIVATE) as cut_extrude_2_sk1:
        with BuildLine():
            Line((5.656501178, 12.068493885), (27.912803901, 12.068493885))
            ThreePointArc((27.912803901, 12.068493885), (31.348151448, 8.633146338), (27.912803901, 5.197798792))
            Line((27.912803901, 5.197798792), (5.656501178, 5.197798792))
            ThreePointArc((5.656501178, 5.197798792), (2.221153632, 8.633146338), (5.656501178, 12.068493885))
        make_face()
    cut_extrude_2_tool1 = extrude(cut_extrude_2_sk1.sketch, amount=-CUT_EXTRUDE_2_REACH, mode=Mode.PRIVATE) & part.part
    add(cut_extrude_2_tool1.solids().sort_by_distance((16.784653, 1, -8.633146))[0], mode=Mode.SUBTRACT)
    # 草图3 → 切除-拉伸2 (cut, up to next)
    with BuildSketch(Plane(origin=(0, 1, 0), x_dir=(1, 0, 0), z_dir=(0, 1, 0)), mode=Mode.PRIVATE) as cut_extrude_2_sk2:
        with BuildLine():
            Line((50.656501178, 12.068493885), (72.912803901, 12.068493885))
            ThreePointArc((72.912803901, 12.068493885), (76.348151448, 8.633146338), (72.912803901, 5.197798792))
            Line((72.912803901, 5.197798792), (50.656501178, 5.197798792))
            ThreePointArc((50.656501178, 5.197798792), (47.221153632, 8.633146338), (50.656501178, 12.068493885))
        make_face()
    cut_extrude_2_tool2 = extrude(cut_extrude_2_sk2.sketch, amount=-CUT_EXTRUDE_2_REACH, mode=Mode.PRIVATE) & part.part
    add(cut_extrude_2_tool2.solids().sort_by_distance((61.784653, 1, -8.633146))[0], mode=Mode.SUBTRACT)
    # 草图3 → 切除-拉伸2 (cut, up to next)
    with BuildSketch(Plane(origin=(0, 1, 0), x_dir=(1, 0, 0), z_dir=(0, 1, 0)), mode=Mode.PRIVATE) as cut_extrude_2_sk3:
        with BuildLine():
            Line((95.656501178, 12.068493885), (117.912803901, 12.068493885))
            ThreePointArc((117.912803901, 12.068493885), (121.348151448, 8.633146338), (117.912803901, 5.197798792))
            Line((117.912803901, 5.197798792), (95.656501178, 5.197798792))
            ThreePointArc((95.656501178, 5.197798792), (92.221153632, 8.633146338), (95.656501178, 12.068493885))
        make_face()
    cut_extrude_2_tool3 = extrude(cut_extrude_2_sk3.sketch, amount=-CUT_EXTRUDE_2_REACH, mode=Mode.PRIVATE) & part.part
    add(cut_extrude_2_tool3.solids().sort_by_distance((106.784653, 1, -8.633146))[0], mode=Mode.SUBTRACT)
    # 草图3 → 切除-拉伸2 (cut, up to next)
    with BuildSketch(Plane(origin=(0, 1, 0), x_dir=(1, 0, 0), z_dir=(0, 1, 0)), mode=Mode.PRIVATE) as cut_extrude_2_sk4:
        with BuildLine():
            Line((140.656501178, 12.068493885), (162.912803901, 12.068493885))
            ThreePointArc((162.912803901, 12.068493885), (166.348151448, 8.633146338), (162.912803901, 5.197798792))
            Line((162.912803901, 5.197798792), (140.656501178, 5.197798792))
            ThreePointArc((140.656501178, 5.197798792), (137.221153632, 8.633146338), (140.656501178, 12.068493885))
        make_face()
    cut_extrude_2_tool4 = extrude(cut_extrude_2_sk4.sketch, amount=-CUT_EXTRUDE_2_REACH, mode=Mode.PRIVATE) & part.part
    add(cut_extrude_2_tool4.solids().sort_by_distance((151.784653, 1, -8.633146))[0], mode=Mode.SUBTRACT)
    # 草图3 → 切除-拉伸2 (cut, up to next)
    with BuildSketch(Plane(origin=(0, 1, 0), x_dir=(1, 0, 0), z_dir=(0, 1, 0)), mode=Mode.PRIVATE) as cut_extrude_2_sk5:
        with BuildLine():
            Line((185.656501178, 12.068493885), (207.912803901, 12.068493885))
            ThreePointArc((207.912803901, 12.068493885), (211.348151448, 8.633146338), (207.912803901, 5.197798792))
            Line((207.912803901, 5.197798792), (185.656501178, 5.197798792))
            ThreePointArc((185.656501178, 5.197798792), (182.221153632, 8.633146338), (185.656501178, 12.068493885))
        make_face()
    cut_extrude_2_tool5 = extrude(cut_extrude_2_sk5.sketch, amount=-CUT_EXTRUDE_2_REACH, mode=Mode.PRIVATE) & part.part
    add(cut_extrude_2_tool5.solids().sort_by_distance((196.784653, 1, -8.633146))[0], mode=Mode.SUBTRACT)
    # 草图3 → 切除-拉伸2 (cut, up to next)
    with BuildSketch(Plane(origin=(0, 1, 0), x_dir=(1, 0, 0), z_dir=(0, 1, 0)), mode=Mode.PRIVATE) as cut_extrude_2_sk6:
        with BuildLine():
            Line((230.656501178, 12.068493885), (252.912803901, 12.068493885))
            ThreePointArc((252.912803901, 12.068493885), (256.348151448, 8.633146338), (252.912803901, 5.197798792))
            Line((252.912803901, 5.197798792), (230.656501178, 5.197798792))
            ThreePointArc((230.656501178, 5.197798792), (227.221153632, 8.633146338), (230.656501178, 12.068493885))
        make_face()
    cut_extrude_2_tool6 = extrude(cut_extrude_2_sk6.sketch, amount=-CUT_EXTRUDE_2_REACH, mode=Mode.PRIVATE) & part.part
    add(cut_extrude_2_tool6.solids().sort_by_distance((241.784653, 1, -8.633146))[0], mode=Mode.SUBTRACT)
    # 草图3 → 切除-拉伸2 (cut, up to next)
    with BuildSketch(Plane(origin=(0, 1, 0), x_dir=(1, 0, 0), z_dir=(0, 1, 0)), mode=Mode.PRIVATE) as cut_extrude_2_sk7:
        with BuildLine():
            Line((275.656501178, 12.068493885), (297.912803901, 12.068493885))
            ThreePointArc((297.912803901, 12.068493885), (301.348151448, 8.633146338), (297.912803901, 5.197798792))
            Line((297.912803901, 5.197798792), (275.656501178, 5.197798792))
            ThreePointArc((275.656501178, 5.197798792), (272.221153632, 8.633146338), (275.656501178, 12.068493885))
        make_face()
    cut_extrude_2_tool7 = extrude(cut_extrude_2_sk7.sketch, amount=-CUT_EXTRUDE_2_REACH, mode=Mode.PRIVATE) & part.part
    add(cut_extrude_2_tool7.solids().sort_by_distance((286.784653, 1, -8.633146))[0], mode=Mode.SUBTRACT)
    # 草图3 → 切除-拉伸2 (cut, up to next)
    with BuildSketch(Plane(origin=(0, 1, 0), x_dir=(1, 0, 0), z_dir=(0, 1, 0)), mode=Mode.PRIVATE) as cut_extrude_2_sk8:
        with BuildLine():
            Line((320.656501178, 12.068493885), (342.912803901, 12.068493885))
            ThreePointArc((342.912803901, 12.068493885), (346.348151448, 8.633146338), (342.912803901, 5.197798792))
            Line((342.912803901, 5.197798792), (320.656501178, 5.197798792))
            ThreePointArc((320.656501178, 5.197798792), (317.221153632, 8.633146338), (320.656501178, 12.068493885))
        make_face()
    cut_extrude_2_tool8 = extrude(cut_extrude_2_sk8.sketch, amount=-CUT_EXTRUDE_2_REACH, mode=Mode.PRIVATE) & part.part
    add(cut_extrude_2_tool8.solids().sort_by_distance((331.784653, 1, -8.633146))[0], mode=Mode.SUBTRACT)


solid = part.part
